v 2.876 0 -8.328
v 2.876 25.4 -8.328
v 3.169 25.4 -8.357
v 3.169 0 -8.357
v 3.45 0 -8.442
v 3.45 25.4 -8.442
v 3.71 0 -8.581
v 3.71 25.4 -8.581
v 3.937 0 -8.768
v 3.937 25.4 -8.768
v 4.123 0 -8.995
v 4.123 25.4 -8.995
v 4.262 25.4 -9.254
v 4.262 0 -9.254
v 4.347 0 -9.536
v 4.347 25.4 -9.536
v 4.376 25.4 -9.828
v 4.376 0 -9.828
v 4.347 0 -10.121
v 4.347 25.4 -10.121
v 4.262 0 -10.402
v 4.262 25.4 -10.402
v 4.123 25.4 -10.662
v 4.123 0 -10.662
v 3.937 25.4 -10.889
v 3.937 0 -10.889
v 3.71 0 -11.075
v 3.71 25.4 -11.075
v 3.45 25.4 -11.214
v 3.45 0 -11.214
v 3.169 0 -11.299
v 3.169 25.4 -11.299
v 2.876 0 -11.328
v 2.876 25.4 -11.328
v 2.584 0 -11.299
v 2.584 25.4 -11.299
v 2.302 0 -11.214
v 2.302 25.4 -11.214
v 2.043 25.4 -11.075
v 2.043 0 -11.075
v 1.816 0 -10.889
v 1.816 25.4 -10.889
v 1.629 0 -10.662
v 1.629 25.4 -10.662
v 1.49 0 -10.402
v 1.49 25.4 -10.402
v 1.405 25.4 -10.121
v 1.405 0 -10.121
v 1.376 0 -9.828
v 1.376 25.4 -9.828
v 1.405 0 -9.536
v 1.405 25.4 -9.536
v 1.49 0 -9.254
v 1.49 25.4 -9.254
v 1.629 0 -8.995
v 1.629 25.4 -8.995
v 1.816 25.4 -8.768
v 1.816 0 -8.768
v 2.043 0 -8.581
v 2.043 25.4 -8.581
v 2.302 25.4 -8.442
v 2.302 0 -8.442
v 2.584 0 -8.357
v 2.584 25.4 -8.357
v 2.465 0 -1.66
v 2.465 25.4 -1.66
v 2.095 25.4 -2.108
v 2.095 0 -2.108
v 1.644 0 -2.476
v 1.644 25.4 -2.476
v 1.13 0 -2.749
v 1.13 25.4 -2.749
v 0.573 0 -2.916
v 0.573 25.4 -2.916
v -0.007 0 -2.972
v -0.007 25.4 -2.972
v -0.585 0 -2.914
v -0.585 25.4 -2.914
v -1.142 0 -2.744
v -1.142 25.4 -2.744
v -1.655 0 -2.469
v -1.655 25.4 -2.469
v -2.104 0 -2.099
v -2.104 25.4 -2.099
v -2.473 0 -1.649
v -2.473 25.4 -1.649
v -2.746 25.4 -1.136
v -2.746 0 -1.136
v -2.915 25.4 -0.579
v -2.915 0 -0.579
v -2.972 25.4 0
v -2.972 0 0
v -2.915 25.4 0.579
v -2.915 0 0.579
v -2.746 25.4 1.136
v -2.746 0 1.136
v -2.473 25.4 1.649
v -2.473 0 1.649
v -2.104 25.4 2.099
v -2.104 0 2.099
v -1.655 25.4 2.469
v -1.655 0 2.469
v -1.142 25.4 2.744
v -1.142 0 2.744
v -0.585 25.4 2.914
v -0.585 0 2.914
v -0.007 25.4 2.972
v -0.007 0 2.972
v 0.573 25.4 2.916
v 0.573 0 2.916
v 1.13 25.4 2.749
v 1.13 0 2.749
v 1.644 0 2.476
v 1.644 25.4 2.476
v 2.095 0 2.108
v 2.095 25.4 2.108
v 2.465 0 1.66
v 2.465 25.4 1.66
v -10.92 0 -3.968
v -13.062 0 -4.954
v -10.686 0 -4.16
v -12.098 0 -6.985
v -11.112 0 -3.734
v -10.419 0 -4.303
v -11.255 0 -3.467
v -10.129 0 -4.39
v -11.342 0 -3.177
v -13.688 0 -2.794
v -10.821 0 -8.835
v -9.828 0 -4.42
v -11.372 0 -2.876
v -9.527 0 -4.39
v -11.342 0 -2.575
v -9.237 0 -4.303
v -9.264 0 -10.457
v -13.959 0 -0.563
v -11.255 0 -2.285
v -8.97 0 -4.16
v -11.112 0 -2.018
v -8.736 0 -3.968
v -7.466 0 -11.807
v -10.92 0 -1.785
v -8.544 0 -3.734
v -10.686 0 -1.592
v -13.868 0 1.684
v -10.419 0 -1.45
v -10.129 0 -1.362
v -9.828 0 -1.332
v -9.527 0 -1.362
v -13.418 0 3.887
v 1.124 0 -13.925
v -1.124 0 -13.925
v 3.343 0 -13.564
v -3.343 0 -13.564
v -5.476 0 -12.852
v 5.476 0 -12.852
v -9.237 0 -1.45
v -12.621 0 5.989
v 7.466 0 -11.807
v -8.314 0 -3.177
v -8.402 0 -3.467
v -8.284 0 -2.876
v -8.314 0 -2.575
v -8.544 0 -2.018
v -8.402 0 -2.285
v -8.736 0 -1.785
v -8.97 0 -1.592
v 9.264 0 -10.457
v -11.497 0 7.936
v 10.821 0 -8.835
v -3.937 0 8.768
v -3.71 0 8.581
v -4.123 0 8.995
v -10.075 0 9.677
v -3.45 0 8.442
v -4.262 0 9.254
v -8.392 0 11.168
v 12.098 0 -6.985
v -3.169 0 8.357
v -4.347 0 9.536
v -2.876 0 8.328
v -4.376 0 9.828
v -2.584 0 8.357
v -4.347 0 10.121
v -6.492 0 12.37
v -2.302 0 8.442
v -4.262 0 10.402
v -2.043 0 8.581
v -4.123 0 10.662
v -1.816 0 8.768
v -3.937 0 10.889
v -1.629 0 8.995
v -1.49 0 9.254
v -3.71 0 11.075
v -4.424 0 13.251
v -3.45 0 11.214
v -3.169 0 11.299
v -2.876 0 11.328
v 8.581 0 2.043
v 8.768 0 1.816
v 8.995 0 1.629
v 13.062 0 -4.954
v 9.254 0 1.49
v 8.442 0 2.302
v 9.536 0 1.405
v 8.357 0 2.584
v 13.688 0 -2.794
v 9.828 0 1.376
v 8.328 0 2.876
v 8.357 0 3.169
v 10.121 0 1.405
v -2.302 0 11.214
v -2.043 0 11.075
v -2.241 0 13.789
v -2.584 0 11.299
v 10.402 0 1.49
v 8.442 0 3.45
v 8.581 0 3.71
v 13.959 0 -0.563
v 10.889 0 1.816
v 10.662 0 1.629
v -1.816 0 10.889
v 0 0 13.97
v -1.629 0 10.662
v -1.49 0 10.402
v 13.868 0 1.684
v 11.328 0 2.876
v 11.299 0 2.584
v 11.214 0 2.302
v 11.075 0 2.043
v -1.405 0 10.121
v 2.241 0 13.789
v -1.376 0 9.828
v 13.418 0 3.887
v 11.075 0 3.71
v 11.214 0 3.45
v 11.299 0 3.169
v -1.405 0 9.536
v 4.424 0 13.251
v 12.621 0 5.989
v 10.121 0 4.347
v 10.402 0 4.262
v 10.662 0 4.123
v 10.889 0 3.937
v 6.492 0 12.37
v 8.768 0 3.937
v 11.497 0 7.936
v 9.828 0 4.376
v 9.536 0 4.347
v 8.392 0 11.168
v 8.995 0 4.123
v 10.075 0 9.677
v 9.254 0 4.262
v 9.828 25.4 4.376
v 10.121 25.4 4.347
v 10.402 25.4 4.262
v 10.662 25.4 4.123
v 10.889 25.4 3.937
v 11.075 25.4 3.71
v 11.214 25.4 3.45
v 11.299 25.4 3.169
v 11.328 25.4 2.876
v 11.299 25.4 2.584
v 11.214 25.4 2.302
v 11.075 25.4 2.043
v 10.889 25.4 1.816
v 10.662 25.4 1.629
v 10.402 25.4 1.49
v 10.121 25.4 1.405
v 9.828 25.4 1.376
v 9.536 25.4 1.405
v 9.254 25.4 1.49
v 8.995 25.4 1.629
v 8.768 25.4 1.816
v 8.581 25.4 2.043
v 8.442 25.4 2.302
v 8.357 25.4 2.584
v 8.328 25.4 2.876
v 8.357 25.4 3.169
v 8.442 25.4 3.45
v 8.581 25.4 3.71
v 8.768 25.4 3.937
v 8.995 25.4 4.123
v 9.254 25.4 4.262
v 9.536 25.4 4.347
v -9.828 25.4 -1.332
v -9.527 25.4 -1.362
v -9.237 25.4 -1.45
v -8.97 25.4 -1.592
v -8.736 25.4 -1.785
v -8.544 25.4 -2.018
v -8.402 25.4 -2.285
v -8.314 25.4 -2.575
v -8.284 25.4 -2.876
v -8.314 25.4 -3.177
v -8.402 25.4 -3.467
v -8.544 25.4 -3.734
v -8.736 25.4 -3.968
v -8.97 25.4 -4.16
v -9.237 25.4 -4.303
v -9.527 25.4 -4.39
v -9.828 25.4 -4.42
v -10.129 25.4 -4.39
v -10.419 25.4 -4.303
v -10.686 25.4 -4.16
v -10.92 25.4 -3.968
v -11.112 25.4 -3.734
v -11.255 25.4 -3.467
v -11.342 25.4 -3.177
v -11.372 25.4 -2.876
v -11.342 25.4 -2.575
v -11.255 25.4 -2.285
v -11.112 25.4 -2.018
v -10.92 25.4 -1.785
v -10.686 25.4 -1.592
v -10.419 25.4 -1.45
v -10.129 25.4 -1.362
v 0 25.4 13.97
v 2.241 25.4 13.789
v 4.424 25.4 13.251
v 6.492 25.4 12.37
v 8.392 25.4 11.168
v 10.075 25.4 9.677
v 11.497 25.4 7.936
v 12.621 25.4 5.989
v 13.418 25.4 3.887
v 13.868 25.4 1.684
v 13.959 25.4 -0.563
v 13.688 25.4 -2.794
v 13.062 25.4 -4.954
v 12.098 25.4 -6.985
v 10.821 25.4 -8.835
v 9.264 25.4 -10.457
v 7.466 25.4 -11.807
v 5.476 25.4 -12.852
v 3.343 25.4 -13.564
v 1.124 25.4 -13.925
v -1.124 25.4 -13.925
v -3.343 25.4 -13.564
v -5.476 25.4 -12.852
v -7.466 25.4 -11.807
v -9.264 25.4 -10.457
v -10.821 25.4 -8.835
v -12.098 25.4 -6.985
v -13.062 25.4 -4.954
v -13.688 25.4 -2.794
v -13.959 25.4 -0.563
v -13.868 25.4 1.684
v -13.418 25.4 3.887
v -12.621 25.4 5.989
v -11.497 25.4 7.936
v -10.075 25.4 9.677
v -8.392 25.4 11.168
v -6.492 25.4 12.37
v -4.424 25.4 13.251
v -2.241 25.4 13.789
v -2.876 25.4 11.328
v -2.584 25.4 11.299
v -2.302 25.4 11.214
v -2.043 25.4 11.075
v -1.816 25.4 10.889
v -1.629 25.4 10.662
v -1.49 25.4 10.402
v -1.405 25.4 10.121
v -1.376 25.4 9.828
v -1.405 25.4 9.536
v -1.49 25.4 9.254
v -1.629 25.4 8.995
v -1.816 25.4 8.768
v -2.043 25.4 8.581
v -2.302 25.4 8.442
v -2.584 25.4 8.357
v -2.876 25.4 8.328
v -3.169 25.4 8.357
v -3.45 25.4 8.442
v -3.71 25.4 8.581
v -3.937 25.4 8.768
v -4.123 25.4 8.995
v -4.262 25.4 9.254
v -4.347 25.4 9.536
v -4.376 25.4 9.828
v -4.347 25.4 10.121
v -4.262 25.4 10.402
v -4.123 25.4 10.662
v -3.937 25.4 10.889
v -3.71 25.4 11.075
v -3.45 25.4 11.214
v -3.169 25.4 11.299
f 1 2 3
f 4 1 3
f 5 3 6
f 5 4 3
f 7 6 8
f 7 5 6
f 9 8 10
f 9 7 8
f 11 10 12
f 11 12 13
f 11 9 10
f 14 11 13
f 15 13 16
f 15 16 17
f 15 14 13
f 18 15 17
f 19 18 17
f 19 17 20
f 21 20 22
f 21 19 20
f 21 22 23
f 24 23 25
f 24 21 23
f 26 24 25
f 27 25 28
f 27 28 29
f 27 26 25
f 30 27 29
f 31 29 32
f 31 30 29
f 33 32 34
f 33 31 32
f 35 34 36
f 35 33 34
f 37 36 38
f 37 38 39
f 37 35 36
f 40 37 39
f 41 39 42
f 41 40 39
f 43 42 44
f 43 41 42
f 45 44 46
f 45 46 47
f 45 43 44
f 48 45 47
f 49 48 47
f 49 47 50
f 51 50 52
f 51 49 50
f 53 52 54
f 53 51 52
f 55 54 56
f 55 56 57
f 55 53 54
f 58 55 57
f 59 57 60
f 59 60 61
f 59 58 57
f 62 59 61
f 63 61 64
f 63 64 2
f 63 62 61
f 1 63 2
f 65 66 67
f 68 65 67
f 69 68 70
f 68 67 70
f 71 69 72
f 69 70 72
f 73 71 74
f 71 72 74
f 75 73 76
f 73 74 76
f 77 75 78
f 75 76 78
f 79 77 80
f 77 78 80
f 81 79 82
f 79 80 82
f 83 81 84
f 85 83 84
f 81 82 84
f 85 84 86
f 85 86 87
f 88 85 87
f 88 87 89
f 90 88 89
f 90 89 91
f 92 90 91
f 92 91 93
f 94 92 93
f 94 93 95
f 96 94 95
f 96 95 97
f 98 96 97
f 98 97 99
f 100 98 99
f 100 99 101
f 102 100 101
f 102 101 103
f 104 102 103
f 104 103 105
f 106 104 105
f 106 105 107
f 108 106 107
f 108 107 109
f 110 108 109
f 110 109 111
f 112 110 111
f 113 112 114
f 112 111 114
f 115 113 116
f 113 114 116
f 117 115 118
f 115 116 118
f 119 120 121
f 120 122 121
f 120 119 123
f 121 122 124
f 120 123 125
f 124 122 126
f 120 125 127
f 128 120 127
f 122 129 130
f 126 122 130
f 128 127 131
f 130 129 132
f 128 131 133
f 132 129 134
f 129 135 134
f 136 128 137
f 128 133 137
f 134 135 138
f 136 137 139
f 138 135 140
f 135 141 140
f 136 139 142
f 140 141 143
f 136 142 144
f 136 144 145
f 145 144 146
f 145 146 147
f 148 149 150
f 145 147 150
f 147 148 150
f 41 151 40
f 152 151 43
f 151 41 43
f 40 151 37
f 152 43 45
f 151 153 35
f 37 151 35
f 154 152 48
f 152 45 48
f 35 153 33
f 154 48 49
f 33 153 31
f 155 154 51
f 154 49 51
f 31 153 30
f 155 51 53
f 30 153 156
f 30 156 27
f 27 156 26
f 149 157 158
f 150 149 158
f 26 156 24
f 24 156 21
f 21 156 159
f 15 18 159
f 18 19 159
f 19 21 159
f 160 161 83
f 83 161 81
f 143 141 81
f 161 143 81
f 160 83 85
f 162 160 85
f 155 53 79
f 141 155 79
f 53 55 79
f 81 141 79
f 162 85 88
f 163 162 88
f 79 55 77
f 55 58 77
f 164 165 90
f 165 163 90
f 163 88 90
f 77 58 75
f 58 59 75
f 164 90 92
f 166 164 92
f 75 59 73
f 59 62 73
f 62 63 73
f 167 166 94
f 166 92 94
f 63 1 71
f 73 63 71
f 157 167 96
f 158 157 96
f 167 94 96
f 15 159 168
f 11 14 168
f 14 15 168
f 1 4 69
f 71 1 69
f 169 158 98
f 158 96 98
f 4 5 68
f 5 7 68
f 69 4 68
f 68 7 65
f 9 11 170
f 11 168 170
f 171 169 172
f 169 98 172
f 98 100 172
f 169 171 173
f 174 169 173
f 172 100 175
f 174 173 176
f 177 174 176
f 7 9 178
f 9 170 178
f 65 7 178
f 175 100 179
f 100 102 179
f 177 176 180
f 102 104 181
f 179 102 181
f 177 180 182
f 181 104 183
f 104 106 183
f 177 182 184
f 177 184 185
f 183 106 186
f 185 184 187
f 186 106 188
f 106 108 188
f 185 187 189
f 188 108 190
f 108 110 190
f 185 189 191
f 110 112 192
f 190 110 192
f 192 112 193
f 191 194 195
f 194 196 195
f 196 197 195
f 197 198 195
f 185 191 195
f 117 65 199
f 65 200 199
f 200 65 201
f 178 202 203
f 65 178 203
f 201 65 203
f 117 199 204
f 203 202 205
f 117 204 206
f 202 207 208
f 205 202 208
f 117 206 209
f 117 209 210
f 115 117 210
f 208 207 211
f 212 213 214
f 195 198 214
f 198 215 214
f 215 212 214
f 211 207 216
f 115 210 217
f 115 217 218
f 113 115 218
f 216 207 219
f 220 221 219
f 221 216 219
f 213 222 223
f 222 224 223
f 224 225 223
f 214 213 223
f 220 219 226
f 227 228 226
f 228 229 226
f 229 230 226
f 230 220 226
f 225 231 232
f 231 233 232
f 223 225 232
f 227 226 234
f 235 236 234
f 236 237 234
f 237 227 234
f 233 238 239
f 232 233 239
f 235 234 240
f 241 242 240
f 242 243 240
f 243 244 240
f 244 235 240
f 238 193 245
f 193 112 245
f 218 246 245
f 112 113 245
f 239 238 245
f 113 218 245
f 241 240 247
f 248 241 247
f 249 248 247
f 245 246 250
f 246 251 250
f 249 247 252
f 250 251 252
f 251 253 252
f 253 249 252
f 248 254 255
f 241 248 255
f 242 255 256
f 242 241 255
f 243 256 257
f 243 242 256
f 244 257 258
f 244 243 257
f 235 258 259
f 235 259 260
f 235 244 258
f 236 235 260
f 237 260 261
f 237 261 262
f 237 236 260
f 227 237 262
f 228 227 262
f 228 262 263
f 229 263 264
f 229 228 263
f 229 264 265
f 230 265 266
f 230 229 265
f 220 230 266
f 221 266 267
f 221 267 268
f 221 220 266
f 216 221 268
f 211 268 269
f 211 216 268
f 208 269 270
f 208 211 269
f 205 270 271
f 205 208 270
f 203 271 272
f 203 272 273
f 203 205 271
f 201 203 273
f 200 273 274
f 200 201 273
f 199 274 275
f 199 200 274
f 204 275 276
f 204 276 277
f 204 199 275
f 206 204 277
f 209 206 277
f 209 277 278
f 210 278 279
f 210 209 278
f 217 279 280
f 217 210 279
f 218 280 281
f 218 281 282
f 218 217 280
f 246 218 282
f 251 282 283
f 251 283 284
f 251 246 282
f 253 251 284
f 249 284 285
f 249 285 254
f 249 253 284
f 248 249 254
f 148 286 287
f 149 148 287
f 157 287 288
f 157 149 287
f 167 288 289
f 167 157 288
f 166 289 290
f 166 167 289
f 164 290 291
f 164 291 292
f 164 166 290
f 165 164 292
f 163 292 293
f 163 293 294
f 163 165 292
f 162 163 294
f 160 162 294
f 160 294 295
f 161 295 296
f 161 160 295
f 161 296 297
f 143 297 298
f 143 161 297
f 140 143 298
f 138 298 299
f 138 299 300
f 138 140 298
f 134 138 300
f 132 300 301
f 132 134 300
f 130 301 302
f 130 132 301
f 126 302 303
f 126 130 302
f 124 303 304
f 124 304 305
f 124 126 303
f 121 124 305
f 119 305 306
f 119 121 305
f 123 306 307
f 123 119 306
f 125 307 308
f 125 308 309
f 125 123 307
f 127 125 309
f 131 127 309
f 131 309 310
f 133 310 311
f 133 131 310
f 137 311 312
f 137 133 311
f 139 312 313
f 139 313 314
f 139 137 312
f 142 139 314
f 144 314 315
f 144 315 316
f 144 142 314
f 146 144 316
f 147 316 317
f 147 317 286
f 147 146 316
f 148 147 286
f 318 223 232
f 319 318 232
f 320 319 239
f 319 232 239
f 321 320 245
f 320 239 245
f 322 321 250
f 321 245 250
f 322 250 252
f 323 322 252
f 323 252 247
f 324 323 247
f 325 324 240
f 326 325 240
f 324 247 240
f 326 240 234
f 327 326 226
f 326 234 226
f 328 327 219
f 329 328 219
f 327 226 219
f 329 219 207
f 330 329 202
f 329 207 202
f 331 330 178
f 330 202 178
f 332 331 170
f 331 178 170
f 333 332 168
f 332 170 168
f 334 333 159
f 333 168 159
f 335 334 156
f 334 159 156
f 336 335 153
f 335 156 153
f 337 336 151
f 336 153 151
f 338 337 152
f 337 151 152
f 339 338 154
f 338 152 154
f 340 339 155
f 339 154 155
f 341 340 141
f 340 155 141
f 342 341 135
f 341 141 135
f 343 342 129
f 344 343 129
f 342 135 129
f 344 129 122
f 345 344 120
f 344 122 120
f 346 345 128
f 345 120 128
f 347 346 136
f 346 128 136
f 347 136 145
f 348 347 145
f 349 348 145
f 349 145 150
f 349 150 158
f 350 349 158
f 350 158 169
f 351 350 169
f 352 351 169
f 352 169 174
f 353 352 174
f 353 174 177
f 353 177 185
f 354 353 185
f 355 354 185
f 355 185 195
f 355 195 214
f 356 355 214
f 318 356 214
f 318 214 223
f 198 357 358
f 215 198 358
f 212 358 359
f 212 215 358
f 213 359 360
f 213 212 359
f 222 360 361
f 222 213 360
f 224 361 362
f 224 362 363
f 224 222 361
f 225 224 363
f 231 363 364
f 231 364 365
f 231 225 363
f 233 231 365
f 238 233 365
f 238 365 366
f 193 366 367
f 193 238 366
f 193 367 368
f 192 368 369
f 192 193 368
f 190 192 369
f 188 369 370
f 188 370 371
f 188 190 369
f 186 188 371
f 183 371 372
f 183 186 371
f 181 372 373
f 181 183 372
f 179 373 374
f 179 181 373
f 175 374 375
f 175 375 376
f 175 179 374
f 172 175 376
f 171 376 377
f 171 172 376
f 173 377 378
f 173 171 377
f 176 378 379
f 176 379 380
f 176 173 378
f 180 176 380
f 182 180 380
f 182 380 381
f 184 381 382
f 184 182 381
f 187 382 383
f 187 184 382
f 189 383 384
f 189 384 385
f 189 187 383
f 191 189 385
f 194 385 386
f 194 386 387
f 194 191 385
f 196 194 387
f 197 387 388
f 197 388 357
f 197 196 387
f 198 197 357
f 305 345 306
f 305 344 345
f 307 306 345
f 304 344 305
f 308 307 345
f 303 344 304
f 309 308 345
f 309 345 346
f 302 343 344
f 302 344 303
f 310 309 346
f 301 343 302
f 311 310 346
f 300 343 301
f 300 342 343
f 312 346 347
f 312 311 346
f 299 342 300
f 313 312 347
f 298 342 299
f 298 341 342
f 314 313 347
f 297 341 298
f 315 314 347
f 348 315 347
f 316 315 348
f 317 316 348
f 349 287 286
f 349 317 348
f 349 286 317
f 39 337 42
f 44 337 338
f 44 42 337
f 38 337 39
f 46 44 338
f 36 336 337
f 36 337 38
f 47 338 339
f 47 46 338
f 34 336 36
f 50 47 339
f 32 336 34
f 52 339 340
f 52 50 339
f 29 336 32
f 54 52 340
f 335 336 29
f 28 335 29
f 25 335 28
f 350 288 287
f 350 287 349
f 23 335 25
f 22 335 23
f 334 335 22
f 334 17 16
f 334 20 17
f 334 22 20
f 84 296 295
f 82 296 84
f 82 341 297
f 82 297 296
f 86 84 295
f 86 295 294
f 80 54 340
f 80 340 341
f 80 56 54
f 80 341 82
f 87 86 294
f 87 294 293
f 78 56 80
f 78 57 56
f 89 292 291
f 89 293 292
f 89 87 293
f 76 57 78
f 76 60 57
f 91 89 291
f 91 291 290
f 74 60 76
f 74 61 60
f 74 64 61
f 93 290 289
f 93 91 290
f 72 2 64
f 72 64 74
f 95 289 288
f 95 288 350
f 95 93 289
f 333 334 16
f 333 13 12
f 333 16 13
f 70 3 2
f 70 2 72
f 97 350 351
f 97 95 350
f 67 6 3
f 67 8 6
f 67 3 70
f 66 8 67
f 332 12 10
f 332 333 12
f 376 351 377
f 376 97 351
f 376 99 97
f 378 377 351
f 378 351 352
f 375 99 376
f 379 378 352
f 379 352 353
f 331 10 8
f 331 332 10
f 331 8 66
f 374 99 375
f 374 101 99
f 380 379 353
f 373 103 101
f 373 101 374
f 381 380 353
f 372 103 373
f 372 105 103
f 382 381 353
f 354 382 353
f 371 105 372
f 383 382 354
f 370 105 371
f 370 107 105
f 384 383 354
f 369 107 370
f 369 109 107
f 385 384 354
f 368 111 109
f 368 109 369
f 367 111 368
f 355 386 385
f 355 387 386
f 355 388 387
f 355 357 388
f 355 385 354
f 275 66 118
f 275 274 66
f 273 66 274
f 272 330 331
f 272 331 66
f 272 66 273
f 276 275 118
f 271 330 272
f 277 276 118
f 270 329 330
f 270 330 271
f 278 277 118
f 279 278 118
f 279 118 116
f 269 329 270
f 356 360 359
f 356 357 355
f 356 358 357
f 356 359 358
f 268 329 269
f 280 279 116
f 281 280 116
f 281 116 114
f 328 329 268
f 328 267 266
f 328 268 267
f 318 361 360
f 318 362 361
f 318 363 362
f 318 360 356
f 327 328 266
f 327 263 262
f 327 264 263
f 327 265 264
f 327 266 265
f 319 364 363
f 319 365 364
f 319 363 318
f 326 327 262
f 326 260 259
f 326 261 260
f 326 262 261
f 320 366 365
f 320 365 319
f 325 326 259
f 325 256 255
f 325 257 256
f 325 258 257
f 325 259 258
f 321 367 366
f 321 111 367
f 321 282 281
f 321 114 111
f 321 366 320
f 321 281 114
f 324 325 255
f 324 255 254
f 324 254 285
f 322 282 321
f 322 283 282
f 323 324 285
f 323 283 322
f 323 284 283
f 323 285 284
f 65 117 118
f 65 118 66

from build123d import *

# Parameters (mm, degrees)
SKETCH1_R           = 13.97
SKETCH1_R_2         = 1.5
SKETCH1_R_3         = 1.543928493
BOSS_EXTRUDE1_DEPTH = 25.4
CUT_EXTRUDE1_DEPTH  = 30


with BuildPart() as part:
    # Sketch1 → Boss-Extrude1 (new body)
    with BuildSketch(Plane(origin=(0, 0, 0), x_dir=(1, 0, 0), z_dir=(0, 1, 0))):
        with Locations(Location((0, 0, 0), (0, 0, 270))):
            Circle(SKETCH1_R)
        with Locations(Location((2.876226708, 9.828189808, 0), (0, 0, 270))):
            Circle(SKETCH1_R_2, mode=Mode.SUBTRACT)
        with Locations(Location((-9.828189808, 2.876226708, 0), (0, 0, 270))):
            Circle(SKETCH1_R_3, mode=Mode.SUBTRACT)
        with Locations(Location((-2.876226708, -9.828189808, 0), (0, 0, 270))):
            Circle(SKETCH1_R_2, mode=Mode.SUBTRACT)
        with Locations(Location((9.828189808, -2.876226708, 0), (0, 0, 270))):
            Circle(SKETCH1_R_2, mode=Mode.SUBTRACT)
    extrude(amount=BOSS_EXTRUDE1_DEPTH)

    # Sketch2 → Cut-Extrude1 (cut)
    with BuildSketch(Plane(origin=(0, 25.4, 0), x_dir=(1, 0, 0), z_dir=(0, 1, 0))):
        with BuildLine():
            Line((2.465312915, -1.66), (2.465312915, 1.66))
            ThreePointArc((2.465312915, 1.66), (-2.97209821, 0), (2.465312915, -1.66))
        make_face()
    extrude(amount=-CUT_EXTRUDE1_DEPTH, mode=Mode.SUBTRACT)


solid = part.part
